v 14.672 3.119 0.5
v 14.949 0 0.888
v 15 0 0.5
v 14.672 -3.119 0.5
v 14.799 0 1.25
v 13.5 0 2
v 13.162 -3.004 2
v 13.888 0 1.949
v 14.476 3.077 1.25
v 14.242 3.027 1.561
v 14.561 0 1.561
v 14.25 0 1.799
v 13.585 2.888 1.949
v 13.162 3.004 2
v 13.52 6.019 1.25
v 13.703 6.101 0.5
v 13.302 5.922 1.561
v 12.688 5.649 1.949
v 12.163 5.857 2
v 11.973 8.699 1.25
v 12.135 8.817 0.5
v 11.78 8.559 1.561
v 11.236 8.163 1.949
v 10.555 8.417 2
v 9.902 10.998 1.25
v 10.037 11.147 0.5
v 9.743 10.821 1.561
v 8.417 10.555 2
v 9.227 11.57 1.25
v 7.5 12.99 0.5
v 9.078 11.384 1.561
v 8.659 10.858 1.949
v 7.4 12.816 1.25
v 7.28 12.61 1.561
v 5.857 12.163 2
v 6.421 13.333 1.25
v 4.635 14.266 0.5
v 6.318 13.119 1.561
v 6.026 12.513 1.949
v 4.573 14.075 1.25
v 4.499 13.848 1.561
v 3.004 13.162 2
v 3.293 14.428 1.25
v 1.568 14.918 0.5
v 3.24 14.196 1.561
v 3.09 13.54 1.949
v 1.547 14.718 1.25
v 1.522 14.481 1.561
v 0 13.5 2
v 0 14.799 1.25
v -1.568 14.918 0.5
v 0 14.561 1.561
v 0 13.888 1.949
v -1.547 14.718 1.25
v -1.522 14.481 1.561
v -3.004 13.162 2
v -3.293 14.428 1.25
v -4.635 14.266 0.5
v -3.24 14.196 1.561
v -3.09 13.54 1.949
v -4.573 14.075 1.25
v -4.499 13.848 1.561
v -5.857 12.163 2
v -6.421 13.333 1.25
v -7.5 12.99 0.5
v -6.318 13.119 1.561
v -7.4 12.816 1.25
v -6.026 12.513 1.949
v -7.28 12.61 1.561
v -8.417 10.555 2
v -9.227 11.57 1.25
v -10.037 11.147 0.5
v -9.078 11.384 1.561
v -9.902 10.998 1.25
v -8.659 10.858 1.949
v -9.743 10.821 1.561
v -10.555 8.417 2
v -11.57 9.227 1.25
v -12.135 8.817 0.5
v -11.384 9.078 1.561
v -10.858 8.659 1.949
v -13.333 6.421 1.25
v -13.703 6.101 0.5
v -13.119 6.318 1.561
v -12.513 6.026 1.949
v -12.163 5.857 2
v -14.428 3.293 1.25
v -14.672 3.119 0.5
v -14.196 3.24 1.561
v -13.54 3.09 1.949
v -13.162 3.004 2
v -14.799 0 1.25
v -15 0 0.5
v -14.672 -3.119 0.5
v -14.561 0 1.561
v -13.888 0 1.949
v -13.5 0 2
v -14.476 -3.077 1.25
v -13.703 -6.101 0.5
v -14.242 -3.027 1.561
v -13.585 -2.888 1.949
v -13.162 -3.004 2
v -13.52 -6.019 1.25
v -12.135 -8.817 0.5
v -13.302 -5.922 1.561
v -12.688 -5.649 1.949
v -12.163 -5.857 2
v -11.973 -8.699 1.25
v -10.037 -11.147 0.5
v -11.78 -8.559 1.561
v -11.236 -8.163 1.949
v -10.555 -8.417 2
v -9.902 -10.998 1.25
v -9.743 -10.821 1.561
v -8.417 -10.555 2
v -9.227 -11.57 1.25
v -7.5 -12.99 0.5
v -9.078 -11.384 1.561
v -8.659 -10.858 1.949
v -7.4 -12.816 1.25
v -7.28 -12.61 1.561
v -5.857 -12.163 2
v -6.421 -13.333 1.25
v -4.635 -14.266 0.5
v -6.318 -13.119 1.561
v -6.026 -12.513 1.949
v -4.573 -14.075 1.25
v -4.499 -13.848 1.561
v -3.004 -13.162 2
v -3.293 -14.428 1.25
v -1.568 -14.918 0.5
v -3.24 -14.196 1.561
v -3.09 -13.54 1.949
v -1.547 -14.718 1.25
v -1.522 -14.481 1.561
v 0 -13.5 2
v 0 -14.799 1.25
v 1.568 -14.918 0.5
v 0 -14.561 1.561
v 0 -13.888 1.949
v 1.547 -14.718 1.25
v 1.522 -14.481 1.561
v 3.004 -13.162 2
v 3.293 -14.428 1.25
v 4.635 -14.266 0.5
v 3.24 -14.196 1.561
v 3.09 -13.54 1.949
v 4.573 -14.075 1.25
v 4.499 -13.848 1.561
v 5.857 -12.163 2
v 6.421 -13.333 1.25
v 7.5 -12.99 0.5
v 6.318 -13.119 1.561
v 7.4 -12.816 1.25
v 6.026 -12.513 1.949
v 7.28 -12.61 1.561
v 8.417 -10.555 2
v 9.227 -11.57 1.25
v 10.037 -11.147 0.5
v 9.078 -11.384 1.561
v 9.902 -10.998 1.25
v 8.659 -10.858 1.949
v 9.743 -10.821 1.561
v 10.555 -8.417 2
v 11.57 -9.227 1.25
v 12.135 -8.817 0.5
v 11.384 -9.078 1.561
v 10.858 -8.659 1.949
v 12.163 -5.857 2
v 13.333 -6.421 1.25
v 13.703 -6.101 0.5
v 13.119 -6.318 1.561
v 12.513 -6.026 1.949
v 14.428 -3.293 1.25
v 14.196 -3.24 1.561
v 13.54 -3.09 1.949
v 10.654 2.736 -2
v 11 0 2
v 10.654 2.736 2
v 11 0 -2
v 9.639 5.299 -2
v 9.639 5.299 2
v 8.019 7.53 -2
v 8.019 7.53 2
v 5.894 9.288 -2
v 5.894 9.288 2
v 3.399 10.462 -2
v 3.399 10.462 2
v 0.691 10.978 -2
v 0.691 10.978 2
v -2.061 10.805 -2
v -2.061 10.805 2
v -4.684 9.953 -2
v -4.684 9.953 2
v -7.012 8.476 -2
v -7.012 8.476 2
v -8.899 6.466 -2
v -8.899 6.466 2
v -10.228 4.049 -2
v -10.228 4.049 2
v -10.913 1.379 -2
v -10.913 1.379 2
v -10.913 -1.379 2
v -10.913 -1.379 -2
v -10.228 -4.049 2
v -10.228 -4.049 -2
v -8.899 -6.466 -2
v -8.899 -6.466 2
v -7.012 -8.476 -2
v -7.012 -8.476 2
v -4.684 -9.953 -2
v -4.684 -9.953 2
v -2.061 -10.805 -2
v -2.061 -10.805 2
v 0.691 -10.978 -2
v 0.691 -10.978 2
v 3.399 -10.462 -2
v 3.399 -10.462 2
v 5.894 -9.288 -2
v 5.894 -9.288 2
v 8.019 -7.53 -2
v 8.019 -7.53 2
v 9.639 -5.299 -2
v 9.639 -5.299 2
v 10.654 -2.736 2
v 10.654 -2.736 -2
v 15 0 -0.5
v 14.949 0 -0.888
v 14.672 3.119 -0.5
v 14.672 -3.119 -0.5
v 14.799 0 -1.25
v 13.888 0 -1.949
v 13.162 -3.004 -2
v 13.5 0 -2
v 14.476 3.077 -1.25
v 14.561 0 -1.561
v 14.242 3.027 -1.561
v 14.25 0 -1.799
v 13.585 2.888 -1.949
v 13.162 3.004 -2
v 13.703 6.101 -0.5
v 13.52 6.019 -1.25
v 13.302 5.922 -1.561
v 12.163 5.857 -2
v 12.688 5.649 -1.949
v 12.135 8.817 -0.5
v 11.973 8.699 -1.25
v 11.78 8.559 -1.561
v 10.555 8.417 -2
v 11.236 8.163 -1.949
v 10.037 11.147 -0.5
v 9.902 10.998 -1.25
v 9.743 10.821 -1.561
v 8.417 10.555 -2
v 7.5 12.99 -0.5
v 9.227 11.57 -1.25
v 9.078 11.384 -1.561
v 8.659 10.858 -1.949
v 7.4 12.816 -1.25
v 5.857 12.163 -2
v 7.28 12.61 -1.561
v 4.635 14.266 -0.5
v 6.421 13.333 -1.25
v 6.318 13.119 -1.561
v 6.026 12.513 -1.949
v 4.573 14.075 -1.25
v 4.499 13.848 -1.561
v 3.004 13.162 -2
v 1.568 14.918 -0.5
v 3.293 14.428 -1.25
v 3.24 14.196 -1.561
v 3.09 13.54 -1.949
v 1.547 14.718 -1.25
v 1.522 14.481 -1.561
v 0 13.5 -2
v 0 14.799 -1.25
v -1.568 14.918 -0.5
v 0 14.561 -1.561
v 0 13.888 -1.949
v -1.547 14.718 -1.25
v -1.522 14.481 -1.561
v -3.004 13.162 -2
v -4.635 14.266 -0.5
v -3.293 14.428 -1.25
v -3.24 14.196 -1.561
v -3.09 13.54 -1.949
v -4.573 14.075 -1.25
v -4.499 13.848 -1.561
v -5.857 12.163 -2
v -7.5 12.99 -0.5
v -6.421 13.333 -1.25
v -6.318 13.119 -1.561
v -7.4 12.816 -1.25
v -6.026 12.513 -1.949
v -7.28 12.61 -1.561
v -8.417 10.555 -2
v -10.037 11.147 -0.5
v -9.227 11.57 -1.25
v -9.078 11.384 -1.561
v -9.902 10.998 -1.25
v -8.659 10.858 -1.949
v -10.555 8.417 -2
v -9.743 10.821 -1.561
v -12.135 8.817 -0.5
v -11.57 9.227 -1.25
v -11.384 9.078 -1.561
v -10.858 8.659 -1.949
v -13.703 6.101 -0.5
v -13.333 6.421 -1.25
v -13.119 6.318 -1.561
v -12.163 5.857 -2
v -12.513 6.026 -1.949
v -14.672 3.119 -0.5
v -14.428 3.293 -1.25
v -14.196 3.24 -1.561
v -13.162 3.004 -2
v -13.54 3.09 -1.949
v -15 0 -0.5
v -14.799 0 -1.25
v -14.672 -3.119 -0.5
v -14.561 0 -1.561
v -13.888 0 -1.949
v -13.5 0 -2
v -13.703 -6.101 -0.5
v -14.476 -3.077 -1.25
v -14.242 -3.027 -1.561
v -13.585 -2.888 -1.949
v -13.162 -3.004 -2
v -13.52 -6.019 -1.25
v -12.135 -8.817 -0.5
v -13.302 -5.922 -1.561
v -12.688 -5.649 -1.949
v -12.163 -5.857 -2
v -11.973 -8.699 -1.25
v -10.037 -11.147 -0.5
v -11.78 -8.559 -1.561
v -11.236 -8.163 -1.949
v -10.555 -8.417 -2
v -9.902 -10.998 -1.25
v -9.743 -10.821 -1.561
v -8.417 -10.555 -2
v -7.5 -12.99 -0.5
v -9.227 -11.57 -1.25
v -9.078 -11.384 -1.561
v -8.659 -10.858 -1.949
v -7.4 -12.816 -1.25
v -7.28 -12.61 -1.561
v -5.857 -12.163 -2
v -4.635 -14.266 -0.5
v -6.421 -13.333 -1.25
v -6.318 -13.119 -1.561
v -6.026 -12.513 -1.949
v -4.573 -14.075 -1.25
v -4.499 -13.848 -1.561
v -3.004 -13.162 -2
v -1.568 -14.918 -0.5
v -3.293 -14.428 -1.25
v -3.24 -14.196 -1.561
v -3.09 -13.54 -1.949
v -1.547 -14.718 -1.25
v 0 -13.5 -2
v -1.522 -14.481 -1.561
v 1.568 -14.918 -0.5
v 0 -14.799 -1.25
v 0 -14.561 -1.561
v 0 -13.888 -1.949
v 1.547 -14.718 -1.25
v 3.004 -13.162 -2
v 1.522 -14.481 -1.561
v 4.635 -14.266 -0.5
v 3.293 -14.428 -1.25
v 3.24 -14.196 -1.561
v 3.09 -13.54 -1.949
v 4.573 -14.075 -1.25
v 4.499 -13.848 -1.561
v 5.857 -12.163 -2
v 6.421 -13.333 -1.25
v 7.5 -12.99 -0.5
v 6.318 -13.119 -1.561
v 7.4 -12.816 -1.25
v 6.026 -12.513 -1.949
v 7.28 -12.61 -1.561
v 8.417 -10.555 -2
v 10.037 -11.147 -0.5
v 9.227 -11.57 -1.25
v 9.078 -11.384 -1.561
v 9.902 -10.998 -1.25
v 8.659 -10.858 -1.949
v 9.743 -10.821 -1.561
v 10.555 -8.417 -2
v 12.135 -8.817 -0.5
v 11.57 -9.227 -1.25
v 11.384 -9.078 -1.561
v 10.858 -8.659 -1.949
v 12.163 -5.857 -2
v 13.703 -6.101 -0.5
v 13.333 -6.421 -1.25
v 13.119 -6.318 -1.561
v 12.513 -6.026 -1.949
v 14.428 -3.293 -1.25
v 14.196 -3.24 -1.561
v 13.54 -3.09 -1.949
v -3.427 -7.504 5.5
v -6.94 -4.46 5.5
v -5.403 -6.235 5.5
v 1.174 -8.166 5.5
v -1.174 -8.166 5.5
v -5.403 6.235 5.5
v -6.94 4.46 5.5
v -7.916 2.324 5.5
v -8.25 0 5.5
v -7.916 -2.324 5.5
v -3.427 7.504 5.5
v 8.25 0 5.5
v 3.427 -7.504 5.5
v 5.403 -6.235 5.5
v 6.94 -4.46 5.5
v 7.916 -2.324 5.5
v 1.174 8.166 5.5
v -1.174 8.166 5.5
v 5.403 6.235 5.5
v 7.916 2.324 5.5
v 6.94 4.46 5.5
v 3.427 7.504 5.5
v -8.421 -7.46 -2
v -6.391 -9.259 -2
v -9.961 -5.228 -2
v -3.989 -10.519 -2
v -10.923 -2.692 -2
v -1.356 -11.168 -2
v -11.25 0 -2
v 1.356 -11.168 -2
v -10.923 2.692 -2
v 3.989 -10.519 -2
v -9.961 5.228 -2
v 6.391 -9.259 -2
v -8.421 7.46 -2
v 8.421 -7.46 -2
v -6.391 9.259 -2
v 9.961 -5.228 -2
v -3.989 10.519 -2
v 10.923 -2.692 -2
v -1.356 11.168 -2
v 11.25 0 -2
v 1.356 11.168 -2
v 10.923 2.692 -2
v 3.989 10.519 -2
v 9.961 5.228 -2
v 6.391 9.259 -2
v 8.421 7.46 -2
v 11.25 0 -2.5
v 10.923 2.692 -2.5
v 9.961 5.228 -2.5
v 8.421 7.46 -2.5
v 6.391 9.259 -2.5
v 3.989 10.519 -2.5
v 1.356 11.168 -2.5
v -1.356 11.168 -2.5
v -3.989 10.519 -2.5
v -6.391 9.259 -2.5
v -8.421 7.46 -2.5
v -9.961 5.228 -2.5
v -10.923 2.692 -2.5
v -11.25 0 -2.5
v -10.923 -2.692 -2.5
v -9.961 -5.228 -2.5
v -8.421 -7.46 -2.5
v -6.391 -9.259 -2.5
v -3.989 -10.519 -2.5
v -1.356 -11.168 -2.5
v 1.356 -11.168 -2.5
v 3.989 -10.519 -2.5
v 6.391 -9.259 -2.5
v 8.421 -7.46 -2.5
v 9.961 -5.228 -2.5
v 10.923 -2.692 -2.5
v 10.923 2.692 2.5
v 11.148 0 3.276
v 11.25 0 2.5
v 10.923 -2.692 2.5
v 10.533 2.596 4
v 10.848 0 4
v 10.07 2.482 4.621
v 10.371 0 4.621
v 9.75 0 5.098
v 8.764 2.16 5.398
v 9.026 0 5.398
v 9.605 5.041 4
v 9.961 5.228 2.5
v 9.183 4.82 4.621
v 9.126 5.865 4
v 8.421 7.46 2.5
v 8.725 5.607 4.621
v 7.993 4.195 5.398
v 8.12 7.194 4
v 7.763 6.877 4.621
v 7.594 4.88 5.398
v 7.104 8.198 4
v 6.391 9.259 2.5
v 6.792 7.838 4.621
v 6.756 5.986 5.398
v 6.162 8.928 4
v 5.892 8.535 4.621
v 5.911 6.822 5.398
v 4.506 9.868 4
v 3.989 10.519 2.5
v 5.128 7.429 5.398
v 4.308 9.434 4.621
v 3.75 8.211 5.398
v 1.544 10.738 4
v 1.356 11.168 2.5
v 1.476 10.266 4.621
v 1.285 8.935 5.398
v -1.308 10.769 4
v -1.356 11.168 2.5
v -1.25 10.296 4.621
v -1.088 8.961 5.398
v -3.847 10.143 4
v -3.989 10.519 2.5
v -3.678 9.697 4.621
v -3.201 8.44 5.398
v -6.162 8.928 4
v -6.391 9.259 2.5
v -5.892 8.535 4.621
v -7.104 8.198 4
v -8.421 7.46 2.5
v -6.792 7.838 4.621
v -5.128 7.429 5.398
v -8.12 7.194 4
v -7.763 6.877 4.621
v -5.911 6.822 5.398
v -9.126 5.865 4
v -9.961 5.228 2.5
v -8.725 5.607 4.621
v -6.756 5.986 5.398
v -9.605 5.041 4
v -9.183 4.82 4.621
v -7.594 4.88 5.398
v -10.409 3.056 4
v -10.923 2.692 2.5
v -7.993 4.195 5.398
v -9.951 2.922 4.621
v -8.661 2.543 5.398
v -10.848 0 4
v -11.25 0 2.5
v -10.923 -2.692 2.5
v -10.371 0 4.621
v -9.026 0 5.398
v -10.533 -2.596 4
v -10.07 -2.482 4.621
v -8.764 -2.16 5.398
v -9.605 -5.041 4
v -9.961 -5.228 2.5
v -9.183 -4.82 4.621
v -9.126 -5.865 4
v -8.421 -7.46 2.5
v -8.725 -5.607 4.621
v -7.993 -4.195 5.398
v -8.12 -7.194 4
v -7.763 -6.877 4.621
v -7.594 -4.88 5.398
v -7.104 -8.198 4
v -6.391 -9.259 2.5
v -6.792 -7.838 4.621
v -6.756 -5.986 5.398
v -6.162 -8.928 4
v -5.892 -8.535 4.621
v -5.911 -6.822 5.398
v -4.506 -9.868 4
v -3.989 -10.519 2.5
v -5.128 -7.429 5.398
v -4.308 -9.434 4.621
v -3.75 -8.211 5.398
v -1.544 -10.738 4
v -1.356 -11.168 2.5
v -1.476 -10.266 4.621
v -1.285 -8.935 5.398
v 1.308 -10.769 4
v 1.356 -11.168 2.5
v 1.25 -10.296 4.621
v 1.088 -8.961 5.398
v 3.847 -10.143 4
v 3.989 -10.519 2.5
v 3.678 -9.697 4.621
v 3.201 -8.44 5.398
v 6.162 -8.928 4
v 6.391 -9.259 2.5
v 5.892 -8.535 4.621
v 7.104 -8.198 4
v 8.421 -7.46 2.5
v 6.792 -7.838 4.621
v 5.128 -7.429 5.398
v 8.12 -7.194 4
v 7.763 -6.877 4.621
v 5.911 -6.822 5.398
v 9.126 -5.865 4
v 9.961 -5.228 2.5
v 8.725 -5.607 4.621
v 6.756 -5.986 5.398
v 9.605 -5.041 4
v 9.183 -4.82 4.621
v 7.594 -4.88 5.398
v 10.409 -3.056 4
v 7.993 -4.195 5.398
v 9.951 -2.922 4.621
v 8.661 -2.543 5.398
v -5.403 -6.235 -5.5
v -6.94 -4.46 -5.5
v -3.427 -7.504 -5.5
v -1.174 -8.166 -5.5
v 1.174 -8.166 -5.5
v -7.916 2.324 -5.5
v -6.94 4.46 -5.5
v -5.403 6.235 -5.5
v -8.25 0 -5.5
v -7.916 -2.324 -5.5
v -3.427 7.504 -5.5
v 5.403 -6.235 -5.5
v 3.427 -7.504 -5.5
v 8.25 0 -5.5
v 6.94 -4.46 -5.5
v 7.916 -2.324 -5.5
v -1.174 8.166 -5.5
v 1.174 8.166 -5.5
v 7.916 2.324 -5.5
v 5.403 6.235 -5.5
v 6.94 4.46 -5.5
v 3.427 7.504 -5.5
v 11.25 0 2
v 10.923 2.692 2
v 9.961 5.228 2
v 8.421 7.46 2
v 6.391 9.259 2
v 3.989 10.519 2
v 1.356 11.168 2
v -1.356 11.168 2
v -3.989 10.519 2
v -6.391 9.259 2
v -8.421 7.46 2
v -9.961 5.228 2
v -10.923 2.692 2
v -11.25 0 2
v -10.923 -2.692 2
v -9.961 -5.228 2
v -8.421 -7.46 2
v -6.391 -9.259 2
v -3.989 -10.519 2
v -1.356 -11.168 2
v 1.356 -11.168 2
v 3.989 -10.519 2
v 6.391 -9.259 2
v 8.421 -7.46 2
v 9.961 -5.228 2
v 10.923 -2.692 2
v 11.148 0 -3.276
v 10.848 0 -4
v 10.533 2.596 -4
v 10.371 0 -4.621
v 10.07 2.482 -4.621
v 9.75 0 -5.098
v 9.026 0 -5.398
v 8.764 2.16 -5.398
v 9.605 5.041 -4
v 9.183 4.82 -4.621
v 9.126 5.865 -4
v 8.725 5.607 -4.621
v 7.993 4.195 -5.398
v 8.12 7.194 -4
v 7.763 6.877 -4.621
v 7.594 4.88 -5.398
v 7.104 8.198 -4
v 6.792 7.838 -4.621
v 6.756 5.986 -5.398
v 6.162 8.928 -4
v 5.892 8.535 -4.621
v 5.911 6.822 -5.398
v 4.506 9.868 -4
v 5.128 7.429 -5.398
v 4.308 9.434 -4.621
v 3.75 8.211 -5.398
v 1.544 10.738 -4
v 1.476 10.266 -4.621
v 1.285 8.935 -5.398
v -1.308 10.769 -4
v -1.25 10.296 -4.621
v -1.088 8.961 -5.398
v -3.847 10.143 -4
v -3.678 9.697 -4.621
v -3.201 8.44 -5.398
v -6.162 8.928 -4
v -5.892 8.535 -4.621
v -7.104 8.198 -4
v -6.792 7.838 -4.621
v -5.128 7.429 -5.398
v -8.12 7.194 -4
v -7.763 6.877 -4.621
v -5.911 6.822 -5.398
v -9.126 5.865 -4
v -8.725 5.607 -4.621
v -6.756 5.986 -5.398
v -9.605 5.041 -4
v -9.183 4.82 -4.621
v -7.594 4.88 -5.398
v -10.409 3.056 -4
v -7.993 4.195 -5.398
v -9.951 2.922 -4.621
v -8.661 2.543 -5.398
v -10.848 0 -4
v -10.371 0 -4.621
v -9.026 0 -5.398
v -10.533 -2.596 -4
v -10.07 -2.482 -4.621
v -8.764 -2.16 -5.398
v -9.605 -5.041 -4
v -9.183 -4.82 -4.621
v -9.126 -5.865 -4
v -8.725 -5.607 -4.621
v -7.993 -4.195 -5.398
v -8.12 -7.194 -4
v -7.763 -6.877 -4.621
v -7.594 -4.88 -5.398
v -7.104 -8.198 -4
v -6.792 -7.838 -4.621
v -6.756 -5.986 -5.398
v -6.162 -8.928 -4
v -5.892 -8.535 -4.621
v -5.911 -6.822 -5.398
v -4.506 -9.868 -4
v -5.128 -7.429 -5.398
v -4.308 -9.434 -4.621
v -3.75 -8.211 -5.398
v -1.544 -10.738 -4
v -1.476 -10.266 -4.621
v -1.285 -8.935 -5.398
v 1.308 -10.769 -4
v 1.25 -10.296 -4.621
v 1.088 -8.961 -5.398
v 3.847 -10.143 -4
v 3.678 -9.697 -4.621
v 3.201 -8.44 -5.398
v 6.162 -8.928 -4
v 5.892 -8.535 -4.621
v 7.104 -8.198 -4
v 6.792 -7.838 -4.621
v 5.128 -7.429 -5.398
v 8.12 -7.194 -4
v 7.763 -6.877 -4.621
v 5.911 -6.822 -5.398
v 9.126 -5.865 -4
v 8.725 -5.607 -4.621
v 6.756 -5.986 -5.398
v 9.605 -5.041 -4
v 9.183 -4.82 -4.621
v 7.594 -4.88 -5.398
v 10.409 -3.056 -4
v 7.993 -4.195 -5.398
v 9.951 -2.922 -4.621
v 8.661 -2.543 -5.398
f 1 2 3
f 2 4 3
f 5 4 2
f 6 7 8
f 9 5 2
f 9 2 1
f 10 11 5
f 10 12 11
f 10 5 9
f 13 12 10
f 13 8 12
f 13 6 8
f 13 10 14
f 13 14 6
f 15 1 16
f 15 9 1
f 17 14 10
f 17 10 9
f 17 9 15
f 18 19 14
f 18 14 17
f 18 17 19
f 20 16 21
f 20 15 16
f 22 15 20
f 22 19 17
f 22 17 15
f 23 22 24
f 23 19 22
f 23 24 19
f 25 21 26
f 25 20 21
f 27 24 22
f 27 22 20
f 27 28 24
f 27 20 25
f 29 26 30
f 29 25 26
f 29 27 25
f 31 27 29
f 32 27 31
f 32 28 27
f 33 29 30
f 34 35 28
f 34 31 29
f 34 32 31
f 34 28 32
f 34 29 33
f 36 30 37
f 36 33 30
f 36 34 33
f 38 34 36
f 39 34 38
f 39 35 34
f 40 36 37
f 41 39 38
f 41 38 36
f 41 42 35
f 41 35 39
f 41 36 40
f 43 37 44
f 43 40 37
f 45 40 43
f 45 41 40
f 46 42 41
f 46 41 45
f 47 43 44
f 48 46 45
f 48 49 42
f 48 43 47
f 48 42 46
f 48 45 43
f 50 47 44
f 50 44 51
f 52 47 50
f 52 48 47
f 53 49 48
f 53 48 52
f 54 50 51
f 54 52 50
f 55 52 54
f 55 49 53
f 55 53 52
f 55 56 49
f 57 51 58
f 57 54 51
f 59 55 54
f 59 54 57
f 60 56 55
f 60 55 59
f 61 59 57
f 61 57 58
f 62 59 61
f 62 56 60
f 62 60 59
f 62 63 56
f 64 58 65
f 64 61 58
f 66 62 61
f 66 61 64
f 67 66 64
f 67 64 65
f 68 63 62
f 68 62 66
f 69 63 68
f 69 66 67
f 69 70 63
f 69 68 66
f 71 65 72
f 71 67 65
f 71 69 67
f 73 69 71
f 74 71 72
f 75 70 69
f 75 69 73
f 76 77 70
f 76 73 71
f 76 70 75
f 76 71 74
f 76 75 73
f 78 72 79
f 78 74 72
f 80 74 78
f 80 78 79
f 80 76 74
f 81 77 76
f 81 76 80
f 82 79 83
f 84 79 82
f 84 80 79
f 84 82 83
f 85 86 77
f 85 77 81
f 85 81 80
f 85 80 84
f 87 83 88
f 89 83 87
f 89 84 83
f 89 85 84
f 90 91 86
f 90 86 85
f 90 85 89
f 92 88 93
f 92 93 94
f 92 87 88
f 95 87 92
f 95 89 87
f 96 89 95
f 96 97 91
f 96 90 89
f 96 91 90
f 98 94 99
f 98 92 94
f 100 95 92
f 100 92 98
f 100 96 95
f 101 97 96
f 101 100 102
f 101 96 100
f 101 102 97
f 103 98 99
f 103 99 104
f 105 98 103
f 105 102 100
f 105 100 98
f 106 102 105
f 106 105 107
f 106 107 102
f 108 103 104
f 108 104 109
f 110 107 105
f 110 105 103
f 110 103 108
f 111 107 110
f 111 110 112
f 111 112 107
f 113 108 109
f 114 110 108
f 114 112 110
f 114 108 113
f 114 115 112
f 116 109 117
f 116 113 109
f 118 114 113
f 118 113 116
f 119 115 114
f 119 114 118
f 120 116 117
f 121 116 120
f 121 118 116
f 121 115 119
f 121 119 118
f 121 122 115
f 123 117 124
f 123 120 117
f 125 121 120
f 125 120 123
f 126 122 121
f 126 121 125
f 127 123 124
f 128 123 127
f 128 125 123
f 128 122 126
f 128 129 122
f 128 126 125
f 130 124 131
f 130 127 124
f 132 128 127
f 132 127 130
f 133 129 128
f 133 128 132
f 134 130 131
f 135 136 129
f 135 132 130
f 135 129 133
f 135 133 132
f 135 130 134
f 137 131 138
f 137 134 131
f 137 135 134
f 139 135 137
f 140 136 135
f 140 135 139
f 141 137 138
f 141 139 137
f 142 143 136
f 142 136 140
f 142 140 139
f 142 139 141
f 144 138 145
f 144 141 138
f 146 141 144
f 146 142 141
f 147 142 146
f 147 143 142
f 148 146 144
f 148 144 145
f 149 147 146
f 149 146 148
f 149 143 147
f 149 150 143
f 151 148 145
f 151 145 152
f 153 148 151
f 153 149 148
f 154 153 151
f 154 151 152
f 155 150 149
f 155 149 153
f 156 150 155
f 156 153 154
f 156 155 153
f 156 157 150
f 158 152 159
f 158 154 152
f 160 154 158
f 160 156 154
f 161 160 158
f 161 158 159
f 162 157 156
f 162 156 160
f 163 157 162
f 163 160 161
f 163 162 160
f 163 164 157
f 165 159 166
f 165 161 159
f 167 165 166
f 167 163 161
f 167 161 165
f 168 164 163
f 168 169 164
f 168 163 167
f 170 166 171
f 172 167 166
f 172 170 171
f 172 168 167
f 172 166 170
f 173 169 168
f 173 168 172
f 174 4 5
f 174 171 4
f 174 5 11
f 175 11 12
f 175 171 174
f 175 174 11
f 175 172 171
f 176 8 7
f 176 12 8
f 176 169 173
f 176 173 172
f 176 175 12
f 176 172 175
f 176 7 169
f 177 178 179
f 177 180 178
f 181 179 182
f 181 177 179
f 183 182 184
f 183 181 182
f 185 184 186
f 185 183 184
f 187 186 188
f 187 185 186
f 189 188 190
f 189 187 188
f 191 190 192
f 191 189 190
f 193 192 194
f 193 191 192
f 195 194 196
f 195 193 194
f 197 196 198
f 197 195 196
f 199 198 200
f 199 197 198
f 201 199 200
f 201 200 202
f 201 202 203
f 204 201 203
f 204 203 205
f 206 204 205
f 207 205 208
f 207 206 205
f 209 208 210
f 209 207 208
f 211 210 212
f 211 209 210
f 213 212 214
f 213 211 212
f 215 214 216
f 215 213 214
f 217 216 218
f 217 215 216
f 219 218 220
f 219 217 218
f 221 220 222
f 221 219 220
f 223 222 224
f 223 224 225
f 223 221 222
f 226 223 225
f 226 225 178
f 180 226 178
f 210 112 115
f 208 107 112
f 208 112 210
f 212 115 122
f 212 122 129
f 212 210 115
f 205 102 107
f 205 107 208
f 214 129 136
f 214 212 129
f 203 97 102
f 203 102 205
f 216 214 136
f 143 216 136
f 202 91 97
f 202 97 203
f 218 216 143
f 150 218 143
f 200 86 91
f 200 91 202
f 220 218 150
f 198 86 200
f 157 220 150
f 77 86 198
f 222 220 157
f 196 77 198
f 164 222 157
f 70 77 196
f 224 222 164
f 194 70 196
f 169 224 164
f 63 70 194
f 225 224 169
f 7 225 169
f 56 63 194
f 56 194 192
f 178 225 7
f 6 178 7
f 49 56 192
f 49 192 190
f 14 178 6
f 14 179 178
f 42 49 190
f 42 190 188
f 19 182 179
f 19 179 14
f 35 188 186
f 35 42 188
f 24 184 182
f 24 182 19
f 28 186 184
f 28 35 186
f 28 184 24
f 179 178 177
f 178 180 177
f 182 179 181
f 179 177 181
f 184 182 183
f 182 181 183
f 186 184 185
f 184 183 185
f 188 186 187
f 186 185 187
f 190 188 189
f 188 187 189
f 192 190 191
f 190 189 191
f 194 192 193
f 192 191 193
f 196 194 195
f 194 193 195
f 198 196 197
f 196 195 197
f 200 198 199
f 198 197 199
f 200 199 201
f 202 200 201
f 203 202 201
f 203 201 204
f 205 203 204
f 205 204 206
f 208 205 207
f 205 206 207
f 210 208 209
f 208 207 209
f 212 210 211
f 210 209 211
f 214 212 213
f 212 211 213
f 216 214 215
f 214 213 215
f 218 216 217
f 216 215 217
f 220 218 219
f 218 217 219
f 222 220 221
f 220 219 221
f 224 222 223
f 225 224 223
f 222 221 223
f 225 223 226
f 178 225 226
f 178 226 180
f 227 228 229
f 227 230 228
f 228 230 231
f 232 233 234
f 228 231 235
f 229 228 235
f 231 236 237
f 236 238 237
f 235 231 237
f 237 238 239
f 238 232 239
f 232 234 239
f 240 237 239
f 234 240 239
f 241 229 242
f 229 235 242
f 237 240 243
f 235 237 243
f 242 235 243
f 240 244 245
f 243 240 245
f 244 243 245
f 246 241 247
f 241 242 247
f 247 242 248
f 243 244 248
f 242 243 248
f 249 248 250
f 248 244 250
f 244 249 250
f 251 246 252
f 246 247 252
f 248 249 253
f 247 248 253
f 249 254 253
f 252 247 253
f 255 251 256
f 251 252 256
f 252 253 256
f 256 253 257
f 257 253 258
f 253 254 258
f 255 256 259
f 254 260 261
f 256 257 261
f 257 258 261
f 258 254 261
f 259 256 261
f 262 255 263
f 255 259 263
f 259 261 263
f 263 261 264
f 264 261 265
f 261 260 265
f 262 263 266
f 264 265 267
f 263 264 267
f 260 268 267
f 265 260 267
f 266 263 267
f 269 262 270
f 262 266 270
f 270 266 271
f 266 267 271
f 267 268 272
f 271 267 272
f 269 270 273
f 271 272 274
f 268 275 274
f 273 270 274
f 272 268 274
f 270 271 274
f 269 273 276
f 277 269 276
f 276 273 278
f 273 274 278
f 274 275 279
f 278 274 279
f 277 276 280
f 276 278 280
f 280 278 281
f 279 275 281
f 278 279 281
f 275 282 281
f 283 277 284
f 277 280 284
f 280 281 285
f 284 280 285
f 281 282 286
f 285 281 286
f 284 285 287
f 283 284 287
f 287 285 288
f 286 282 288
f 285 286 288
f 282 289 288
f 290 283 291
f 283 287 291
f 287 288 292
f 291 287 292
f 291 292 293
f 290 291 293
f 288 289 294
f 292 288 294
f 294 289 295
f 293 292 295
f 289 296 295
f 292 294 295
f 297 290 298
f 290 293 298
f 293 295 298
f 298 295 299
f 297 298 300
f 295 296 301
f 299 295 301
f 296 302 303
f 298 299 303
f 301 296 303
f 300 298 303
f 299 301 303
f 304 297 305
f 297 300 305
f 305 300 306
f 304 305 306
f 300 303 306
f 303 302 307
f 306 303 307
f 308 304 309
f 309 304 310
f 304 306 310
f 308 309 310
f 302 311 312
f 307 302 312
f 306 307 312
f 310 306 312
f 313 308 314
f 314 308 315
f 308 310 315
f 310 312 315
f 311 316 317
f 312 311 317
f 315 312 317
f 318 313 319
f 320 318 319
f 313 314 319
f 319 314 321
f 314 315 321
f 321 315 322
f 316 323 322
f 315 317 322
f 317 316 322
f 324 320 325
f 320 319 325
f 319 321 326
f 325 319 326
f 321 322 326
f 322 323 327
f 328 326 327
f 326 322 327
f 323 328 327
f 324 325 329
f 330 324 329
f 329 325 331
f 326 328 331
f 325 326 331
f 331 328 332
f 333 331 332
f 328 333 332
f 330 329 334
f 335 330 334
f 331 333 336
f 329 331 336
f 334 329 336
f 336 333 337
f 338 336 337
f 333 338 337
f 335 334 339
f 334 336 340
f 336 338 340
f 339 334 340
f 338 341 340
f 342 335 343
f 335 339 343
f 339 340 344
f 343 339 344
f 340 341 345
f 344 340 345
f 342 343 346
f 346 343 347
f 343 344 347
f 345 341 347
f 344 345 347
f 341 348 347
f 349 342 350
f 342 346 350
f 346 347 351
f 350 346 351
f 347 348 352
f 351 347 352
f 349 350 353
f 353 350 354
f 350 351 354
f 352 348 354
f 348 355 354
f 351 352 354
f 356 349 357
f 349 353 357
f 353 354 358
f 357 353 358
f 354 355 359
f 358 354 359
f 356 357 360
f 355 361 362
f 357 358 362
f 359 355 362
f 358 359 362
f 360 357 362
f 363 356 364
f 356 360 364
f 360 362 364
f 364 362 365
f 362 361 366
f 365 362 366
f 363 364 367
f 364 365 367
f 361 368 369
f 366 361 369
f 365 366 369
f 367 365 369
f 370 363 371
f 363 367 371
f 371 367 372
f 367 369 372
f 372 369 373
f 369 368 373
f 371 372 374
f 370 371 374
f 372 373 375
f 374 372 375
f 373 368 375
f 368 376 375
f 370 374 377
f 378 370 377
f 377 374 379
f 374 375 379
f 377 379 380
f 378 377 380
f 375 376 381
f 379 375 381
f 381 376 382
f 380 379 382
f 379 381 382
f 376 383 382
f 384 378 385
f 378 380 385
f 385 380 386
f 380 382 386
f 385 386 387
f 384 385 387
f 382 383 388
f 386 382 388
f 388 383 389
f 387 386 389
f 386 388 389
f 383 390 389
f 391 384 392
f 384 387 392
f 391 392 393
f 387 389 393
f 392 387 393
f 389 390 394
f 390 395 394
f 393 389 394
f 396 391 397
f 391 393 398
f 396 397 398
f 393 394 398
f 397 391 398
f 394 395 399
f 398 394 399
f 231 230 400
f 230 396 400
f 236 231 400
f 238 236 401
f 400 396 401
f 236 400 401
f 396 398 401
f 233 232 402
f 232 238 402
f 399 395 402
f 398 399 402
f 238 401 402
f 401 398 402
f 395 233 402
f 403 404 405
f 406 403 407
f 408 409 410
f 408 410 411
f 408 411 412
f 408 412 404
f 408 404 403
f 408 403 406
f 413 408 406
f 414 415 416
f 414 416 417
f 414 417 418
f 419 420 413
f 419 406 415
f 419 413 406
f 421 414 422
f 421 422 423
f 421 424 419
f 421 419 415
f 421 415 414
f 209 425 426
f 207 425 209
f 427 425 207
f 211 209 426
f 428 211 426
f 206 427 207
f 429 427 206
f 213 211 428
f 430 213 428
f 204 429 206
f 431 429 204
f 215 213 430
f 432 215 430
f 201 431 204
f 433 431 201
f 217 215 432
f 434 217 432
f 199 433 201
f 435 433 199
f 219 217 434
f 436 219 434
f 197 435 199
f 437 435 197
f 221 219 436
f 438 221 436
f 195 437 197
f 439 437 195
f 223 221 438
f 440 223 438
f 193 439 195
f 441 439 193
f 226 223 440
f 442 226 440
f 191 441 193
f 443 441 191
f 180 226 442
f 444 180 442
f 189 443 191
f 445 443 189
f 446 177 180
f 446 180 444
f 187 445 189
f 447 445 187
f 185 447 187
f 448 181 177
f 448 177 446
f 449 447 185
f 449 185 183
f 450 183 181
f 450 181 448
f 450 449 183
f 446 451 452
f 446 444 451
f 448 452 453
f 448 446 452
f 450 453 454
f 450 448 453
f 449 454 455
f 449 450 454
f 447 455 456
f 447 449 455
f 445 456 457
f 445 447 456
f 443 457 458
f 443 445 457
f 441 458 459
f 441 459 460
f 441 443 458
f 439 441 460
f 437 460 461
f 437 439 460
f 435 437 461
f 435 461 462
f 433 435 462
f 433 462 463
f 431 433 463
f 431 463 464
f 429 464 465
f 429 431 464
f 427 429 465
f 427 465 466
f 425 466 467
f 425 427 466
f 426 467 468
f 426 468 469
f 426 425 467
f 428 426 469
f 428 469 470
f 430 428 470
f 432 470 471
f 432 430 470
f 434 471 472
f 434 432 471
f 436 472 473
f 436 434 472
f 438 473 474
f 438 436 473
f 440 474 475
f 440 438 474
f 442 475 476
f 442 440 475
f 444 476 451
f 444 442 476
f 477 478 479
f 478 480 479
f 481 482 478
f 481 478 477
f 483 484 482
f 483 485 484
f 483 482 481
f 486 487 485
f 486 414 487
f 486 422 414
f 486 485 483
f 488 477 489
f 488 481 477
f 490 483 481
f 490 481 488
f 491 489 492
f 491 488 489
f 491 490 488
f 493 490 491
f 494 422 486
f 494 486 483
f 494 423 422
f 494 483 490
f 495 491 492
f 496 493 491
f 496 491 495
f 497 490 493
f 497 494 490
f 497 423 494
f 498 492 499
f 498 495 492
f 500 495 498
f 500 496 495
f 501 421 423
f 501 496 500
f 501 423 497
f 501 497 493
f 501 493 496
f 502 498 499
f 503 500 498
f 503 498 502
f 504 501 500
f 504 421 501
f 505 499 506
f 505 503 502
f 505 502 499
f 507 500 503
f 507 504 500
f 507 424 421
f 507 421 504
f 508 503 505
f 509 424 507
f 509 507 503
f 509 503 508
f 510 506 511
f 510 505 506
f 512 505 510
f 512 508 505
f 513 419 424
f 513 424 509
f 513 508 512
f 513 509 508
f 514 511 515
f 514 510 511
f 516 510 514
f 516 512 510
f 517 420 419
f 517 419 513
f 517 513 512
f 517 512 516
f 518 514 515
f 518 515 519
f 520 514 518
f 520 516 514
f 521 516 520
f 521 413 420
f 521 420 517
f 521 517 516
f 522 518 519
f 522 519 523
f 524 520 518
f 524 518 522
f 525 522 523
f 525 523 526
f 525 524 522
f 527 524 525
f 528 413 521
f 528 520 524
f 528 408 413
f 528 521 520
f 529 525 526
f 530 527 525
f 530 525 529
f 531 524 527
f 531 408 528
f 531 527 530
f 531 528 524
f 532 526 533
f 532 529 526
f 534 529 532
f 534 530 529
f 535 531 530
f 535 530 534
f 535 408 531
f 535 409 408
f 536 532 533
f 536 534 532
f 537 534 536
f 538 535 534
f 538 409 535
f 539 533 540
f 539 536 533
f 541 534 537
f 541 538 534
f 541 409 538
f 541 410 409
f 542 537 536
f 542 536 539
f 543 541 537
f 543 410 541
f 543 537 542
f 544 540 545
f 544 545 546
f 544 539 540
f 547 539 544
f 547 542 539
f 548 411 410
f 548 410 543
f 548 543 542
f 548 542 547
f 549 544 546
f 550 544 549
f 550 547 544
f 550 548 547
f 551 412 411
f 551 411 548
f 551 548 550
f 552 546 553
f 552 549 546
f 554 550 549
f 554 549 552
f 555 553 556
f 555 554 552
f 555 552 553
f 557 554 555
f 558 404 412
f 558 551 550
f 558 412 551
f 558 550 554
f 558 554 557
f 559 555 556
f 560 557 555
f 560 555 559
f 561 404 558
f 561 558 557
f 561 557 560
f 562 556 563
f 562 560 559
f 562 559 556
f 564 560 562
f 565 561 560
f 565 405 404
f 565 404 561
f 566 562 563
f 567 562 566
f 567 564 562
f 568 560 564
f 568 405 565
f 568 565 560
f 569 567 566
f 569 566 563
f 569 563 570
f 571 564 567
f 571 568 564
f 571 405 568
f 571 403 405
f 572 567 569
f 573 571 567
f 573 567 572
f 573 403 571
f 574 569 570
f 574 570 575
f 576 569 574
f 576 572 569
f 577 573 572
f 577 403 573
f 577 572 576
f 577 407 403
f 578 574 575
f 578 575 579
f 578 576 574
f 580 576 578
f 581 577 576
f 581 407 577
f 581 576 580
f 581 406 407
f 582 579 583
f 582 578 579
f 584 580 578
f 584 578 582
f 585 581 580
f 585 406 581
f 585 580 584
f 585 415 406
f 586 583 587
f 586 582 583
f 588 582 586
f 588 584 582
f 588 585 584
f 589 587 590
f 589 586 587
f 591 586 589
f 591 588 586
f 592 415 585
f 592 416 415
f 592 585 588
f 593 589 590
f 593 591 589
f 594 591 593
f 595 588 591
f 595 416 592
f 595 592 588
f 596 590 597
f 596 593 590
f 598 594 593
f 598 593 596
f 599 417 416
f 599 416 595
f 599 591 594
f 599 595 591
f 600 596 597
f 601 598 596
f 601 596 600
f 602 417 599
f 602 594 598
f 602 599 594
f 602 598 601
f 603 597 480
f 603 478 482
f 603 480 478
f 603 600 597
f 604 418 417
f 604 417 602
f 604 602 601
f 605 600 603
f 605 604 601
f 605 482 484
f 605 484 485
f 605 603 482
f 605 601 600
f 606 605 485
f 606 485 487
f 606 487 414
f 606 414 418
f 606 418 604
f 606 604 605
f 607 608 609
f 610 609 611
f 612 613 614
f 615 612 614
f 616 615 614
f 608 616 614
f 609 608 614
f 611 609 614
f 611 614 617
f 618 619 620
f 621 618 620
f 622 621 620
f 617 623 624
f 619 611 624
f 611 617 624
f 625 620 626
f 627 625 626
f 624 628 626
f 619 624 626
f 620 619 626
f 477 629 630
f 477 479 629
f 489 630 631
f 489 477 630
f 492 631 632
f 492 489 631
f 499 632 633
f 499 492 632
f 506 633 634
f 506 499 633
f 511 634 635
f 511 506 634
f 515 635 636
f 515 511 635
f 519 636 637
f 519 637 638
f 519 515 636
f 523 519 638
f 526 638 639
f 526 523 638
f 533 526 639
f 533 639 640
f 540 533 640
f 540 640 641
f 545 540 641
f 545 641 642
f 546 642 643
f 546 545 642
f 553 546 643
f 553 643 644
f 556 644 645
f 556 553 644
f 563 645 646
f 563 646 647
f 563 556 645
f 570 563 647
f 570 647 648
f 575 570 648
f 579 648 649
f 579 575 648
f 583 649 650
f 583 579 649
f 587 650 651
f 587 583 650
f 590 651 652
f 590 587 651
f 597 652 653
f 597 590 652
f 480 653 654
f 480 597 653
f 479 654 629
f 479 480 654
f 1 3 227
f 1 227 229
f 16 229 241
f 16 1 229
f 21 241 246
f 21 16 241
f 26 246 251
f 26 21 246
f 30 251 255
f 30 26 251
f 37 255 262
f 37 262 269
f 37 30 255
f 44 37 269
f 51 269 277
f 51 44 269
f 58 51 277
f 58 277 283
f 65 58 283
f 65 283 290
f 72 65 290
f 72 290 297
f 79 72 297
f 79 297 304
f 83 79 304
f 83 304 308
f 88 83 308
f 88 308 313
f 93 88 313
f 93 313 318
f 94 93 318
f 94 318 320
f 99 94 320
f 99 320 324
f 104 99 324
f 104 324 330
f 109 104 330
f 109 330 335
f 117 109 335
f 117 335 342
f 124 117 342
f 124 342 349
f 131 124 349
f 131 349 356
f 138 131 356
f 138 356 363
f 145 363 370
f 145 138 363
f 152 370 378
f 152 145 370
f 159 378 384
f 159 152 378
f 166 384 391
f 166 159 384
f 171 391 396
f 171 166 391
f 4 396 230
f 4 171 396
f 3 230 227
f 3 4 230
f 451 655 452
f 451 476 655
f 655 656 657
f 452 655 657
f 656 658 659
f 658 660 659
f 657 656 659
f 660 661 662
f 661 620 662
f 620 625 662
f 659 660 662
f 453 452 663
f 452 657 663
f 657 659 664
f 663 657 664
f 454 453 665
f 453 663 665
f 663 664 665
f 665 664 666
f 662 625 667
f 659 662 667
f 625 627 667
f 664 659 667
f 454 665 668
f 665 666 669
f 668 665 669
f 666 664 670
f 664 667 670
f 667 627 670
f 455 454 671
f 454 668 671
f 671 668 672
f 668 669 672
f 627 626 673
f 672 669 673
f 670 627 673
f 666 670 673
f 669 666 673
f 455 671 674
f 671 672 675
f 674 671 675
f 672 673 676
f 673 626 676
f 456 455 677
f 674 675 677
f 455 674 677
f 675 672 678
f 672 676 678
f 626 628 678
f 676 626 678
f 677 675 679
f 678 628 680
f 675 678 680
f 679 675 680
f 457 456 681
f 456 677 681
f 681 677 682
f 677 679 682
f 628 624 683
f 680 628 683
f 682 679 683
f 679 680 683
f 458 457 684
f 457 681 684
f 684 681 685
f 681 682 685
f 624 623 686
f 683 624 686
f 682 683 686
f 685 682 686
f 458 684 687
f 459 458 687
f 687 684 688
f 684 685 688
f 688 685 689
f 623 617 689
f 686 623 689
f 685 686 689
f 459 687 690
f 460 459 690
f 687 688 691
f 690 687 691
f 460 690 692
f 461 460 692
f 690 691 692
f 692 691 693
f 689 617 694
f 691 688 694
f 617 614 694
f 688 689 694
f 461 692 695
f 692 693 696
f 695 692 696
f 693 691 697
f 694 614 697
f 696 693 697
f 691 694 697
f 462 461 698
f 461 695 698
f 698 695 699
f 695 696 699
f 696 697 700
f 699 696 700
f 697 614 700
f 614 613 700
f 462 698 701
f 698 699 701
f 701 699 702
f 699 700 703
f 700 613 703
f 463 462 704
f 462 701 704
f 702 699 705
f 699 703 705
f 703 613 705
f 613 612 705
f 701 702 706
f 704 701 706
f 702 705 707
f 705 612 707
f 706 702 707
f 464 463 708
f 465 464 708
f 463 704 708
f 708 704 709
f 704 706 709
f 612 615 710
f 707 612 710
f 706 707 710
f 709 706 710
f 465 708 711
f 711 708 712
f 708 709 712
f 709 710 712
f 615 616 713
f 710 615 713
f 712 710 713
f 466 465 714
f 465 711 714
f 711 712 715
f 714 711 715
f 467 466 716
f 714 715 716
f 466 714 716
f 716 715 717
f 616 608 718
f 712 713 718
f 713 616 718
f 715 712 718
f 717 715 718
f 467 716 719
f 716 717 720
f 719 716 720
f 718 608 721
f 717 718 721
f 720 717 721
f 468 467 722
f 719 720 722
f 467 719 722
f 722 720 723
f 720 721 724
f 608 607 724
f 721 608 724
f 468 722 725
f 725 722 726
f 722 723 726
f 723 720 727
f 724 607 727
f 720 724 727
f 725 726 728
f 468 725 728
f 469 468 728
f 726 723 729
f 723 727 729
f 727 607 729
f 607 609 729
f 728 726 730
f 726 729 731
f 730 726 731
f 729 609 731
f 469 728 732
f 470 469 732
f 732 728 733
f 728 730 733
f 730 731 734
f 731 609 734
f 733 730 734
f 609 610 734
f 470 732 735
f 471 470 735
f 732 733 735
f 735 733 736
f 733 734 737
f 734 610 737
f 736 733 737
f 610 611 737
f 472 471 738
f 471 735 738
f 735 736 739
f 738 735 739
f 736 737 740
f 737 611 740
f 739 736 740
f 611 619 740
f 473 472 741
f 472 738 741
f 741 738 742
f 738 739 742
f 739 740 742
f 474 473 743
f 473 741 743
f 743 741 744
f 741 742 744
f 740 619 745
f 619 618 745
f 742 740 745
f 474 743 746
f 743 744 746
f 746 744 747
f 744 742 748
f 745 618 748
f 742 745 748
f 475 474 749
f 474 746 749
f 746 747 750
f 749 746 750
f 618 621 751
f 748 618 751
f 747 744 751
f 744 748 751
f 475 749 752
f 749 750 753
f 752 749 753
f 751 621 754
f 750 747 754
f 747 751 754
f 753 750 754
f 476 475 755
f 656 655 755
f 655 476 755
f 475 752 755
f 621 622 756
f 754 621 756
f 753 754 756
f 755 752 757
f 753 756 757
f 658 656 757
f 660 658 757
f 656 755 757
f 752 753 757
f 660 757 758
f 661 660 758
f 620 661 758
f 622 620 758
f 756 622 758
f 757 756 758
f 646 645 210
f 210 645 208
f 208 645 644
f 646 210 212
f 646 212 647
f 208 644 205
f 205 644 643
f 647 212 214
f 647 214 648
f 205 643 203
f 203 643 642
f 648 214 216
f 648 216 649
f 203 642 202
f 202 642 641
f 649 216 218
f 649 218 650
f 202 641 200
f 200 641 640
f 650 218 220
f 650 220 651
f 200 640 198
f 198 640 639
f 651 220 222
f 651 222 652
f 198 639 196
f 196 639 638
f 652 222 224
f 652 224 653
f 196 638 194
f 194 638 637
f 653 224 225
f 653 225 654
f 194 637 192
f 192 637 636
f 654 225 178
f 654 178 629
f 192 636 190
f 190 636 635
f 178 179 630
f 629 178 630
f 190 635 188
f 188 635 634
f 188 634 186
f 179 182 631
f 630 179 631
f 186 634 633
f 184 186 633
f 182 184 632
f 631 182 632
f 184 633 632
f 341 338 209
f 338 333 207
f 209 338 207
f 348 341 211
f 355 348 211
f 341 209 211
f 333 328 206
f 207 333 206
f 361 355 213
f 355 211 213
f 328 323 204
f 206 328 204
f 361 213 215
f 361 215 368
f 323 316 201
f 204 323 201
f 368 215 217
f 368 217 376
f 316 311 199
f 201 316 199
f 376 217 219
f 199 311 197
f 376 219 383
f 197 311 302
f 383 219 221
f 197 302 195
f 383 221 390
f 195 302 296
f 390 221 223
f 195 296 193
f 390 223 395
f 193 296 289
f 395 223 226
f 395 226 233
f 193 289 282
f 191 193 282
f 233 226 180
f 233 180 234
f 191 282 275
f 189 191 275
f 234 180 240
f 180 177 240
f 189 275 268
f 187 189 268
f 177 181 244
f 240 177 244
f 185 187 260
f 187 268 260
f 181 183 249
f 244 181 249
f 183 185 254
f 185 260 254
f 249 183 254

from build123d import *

# Parameters (mm, degrees)
F2_R     = 15
F2_R_2   = 11
F3_DEPTH = 2
F4_R     = 11.25
F5_DEPTH = 5.5
F6_R     = 3
F9_R     = 1.5


with BuildPart() as f3:
    # F2 (on Top) → F3 (new body, symmetric)
    with BuildSketch(Plane.XY):
        Circle(F2_R)
        Circle(F2_R_2, mode=Mode.SUBTRACT)
    extrude(amount=F3_DEPTH, both=True)


with BuildPart() as f5:
    # F4 (on Top) → F5 (new body, symmetric)
    with BuildSketch(Plane.XY):
        Circle(F4_R)
    extrude(amount=F5_DEPTH, both=True)

    # F6
    f6_edges = [f5.edges().sort_by_distance(p)[0] for p in [
        (-11.25, 0, 5.5),
        (-11.25, 0, -5.5),
    ]]
    fillet(f6_edges, radius=F6_R)


with BuildPart() as f7_1:
    # F7: copy of F3
    add(f3.part)


with BuildPart() as f5_1:
    add(f5.part)

    # F8: cut F7_1
    add(f7_1.part, mode=Mode.SUBTRACT)


with BuildPart() as f3_1:
    add(f3.part)

    # F9
    f9_edges = [f3_1.edges().sort_by_distance(p)[0] for p in [
        (-15, 0, -2),
        (15, 0, 0),
        (-15, 0, 2),
    ]]
    fillet(f9_edges, radius=F9_R)


solid = Compound([f5_1.part, f3_1.part])
